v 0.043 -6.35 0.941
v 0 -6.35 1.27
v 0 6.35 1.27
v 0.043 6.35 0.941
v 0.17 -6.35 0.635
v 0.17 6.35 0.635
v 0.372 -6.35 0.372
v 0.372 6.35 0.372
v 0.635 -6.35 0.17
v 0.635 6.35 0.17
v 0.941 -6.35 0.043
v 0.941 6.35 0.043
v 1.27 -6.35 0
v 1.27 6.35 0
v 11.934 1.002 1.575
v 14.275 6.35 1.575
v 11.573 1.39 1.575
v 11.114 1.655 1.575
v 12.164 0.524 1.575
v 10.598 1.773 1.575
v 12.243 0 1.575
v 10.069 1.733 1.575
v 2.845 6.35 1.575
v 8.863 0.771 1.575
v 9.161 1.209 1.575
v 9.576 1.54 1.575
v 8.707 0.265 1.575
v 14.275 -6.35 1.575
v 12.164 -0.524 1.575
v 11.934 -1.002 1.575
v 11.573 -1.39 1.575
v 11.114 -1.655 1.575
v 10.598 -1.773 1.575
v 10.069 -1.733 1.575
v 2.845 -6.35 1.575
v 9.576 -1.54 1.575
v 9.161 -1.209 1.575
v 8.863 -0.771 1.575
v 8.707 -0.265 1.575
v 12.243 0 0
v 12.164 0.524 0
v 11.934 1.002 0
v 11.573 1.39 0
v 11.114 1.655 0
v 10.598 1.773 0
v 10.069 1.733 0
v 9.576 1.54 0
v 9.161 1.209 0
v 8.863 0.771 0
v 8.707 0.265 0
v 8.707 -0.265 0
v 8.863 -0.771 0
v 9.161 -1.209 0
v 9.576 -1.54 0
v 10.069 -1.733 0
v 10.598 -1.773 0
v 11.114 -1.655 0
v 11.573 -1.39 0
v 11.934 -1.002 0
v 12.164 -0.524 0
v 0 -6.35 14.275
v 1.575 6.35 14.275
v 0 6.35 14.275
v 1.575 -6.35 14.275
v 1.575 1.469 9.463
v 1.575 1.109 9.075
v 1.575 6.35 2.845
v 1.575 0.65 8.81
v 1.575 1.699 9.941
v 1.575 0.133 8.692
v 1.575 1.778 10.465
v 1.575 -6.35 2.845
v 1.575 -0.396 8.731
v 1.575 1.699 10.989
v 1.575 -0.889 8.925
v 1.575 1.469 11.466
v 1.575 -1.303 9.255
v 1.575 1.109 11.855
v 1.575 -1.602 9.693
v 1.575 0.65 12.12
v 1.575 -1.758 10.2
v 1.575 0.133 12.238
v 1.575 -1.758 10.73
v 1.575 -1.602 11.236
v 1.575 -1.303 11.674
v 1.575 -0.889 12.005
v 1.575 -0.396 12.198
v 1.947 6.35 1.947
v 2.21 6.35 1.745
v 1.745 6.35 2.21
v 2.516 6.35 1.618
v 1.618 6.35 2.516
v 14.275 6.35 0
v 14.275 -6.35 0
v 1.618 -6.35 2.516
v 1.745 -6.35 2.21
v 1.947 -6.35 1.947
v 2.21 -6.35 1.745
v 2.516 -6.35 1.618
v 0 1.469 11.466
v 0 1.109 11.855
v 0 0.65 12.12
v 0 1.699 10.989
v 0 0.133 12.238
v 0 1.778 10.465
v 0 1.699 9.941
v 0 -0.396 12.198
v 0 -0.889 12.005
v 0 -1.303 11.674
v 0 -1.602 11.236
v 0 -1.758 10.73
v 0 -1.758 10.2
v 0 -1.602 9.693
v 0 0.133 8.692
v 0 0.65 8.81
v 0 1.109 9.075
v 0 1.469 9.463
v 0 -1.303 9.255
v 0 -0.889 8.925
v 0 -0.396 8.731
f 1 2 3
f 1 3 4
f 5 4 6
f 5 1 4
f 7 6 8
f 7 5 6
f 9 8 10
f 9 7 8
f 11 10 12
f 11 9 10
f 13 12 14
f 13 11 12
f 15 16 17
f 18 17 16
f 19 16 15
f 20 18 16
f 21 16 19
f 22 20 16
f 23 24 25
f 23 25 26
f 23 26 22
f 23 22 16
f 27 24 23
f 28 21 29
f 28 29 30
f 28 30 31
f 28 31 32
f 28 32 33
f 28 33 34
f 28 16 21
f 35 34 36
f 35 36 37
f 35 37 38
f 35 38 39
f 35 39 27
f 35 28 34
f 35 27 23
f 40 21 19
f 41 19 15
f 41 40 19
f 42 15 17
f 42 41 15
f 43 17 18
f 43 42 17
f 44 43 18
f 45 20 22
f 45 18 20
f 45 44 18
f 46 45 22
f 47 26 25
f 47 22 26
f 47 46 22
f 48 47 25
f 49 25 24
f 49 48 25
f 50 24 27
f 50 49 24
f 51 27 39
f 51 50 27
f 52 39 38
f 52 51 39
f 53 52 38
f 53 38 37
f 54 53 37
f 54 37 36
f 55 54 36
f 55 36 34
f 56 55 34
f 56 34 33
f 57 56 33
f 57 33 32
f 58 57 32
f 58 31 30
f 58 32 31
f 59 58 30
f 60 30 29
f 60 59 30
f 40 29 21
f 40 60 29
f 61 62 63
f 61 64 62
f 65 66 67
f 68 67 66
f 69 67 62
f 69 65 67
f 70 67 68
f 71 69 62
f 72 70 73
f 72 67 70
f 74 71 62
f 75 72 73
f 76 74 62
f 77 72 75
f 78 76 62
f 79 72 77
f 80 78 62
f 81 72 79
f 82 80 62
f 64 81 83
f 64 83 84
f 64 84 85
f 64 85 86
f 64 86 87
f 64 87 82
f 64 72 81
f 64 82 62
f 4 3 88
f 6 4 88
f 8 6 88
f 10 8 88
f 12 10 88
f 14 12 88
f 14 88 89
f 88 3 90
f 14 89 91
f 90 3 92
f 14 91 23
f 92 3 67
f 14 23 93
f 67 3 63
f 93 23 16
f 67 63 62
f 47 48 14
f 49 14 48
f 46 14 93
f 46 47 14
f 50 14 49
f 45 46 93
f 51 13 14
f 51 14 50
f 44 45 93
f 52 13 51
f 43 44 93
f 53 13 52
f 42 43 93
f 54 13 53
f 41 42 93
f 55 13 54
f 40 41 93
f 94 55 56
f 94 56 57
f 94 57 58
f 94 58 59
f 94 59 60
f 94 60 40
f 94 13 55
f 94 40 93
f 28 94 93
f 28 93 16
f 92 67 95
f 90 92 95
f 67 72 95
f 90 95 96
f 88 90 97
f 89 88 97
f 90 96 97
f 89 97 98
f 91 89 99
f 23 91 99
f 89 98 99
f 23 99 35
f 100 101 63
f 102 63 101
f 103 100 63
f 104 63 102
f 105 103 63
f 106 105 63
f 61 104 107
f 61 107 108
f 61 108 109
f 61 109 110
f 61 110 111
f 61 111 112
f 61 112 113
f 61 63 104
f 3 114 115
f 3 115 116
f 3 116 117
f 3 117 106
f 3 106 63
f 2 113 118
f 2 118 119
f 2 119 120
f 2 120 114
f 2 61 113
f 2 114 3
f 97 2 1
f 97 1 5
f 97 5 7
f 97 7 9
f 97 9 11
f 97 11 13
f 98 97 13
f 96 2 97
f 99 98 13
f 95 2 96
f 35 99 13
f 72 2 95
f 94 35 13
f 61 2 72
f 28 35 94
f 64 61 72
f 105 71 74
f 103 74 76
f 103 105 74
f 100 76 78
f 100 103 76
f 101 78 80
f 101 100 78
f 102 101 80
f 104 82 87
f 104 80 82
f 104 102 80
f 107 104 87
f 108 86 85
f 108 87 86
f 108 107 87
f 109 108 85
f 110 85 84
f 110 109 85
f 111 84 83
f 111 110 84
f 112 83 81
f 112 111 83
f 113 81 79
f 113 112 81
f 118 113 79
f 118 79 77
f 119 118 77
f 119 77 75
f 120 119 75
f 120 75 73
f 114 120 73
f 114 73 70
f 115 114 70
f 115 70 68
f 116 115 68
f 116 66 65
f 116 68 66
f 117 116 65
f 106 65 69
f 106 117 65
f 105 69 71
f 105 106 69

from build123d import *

# Parameters (mm, degrees)
PAD_DEPTH       = 6.35
SKETCH001_R     = 1.778
POCKET_DEPTH    = 14.2758
SKETCH002_R     = 1.778
POCKET001_DEPTH = 14.2758


with BuildPart() as part:
    # Sketch → Pad (new body, symmetric)
    with BuildSketch(Plane.XZ):
        with BuildLine():
            Line((0, 14.2748), (0, 1.27))
            ThreePointArc((0, 1.27), (0.371974, 0.371974), (1.27, 0))
            Line((1.27, 0), (14.2748, 0))
            Line((14.2748, 0), (14.2748, 1.5748))
            Line((14.2748, 1.5748), (2.8448, 1.5748))
            ThreePointArc((1.5748, 2.8448), (1.946774, 1.946774), (2.8448, 1.5748))
            Line((1.5748, 2.8448), (1.5748, 14.2748))
            Line((1.5748, 14.2748), (0, 14.2748))
        make_face()
    extrude(amount=PAD_DEPTH, both=True)

    # Sketch001 → Pocket (cut, through all)
    with BuildSketch(Plane.XY):
        with Locations((10.4648, 0)):
            Circle(SKETCH001_R)
    extrude(amount=POCKET_DEPTH, mode=Mode.SUBTRACT)

    # Sketch002 → Pocket001 (cut, through all)
    with BuildSketch(Plane.YZ):
        with Locations((0, 10.4648)):
            Circle(SKETCH002_R)
    extrude(amount=POCKET001_DEPTH, mode=Mode.SUBTRACT)


solid = part.part
